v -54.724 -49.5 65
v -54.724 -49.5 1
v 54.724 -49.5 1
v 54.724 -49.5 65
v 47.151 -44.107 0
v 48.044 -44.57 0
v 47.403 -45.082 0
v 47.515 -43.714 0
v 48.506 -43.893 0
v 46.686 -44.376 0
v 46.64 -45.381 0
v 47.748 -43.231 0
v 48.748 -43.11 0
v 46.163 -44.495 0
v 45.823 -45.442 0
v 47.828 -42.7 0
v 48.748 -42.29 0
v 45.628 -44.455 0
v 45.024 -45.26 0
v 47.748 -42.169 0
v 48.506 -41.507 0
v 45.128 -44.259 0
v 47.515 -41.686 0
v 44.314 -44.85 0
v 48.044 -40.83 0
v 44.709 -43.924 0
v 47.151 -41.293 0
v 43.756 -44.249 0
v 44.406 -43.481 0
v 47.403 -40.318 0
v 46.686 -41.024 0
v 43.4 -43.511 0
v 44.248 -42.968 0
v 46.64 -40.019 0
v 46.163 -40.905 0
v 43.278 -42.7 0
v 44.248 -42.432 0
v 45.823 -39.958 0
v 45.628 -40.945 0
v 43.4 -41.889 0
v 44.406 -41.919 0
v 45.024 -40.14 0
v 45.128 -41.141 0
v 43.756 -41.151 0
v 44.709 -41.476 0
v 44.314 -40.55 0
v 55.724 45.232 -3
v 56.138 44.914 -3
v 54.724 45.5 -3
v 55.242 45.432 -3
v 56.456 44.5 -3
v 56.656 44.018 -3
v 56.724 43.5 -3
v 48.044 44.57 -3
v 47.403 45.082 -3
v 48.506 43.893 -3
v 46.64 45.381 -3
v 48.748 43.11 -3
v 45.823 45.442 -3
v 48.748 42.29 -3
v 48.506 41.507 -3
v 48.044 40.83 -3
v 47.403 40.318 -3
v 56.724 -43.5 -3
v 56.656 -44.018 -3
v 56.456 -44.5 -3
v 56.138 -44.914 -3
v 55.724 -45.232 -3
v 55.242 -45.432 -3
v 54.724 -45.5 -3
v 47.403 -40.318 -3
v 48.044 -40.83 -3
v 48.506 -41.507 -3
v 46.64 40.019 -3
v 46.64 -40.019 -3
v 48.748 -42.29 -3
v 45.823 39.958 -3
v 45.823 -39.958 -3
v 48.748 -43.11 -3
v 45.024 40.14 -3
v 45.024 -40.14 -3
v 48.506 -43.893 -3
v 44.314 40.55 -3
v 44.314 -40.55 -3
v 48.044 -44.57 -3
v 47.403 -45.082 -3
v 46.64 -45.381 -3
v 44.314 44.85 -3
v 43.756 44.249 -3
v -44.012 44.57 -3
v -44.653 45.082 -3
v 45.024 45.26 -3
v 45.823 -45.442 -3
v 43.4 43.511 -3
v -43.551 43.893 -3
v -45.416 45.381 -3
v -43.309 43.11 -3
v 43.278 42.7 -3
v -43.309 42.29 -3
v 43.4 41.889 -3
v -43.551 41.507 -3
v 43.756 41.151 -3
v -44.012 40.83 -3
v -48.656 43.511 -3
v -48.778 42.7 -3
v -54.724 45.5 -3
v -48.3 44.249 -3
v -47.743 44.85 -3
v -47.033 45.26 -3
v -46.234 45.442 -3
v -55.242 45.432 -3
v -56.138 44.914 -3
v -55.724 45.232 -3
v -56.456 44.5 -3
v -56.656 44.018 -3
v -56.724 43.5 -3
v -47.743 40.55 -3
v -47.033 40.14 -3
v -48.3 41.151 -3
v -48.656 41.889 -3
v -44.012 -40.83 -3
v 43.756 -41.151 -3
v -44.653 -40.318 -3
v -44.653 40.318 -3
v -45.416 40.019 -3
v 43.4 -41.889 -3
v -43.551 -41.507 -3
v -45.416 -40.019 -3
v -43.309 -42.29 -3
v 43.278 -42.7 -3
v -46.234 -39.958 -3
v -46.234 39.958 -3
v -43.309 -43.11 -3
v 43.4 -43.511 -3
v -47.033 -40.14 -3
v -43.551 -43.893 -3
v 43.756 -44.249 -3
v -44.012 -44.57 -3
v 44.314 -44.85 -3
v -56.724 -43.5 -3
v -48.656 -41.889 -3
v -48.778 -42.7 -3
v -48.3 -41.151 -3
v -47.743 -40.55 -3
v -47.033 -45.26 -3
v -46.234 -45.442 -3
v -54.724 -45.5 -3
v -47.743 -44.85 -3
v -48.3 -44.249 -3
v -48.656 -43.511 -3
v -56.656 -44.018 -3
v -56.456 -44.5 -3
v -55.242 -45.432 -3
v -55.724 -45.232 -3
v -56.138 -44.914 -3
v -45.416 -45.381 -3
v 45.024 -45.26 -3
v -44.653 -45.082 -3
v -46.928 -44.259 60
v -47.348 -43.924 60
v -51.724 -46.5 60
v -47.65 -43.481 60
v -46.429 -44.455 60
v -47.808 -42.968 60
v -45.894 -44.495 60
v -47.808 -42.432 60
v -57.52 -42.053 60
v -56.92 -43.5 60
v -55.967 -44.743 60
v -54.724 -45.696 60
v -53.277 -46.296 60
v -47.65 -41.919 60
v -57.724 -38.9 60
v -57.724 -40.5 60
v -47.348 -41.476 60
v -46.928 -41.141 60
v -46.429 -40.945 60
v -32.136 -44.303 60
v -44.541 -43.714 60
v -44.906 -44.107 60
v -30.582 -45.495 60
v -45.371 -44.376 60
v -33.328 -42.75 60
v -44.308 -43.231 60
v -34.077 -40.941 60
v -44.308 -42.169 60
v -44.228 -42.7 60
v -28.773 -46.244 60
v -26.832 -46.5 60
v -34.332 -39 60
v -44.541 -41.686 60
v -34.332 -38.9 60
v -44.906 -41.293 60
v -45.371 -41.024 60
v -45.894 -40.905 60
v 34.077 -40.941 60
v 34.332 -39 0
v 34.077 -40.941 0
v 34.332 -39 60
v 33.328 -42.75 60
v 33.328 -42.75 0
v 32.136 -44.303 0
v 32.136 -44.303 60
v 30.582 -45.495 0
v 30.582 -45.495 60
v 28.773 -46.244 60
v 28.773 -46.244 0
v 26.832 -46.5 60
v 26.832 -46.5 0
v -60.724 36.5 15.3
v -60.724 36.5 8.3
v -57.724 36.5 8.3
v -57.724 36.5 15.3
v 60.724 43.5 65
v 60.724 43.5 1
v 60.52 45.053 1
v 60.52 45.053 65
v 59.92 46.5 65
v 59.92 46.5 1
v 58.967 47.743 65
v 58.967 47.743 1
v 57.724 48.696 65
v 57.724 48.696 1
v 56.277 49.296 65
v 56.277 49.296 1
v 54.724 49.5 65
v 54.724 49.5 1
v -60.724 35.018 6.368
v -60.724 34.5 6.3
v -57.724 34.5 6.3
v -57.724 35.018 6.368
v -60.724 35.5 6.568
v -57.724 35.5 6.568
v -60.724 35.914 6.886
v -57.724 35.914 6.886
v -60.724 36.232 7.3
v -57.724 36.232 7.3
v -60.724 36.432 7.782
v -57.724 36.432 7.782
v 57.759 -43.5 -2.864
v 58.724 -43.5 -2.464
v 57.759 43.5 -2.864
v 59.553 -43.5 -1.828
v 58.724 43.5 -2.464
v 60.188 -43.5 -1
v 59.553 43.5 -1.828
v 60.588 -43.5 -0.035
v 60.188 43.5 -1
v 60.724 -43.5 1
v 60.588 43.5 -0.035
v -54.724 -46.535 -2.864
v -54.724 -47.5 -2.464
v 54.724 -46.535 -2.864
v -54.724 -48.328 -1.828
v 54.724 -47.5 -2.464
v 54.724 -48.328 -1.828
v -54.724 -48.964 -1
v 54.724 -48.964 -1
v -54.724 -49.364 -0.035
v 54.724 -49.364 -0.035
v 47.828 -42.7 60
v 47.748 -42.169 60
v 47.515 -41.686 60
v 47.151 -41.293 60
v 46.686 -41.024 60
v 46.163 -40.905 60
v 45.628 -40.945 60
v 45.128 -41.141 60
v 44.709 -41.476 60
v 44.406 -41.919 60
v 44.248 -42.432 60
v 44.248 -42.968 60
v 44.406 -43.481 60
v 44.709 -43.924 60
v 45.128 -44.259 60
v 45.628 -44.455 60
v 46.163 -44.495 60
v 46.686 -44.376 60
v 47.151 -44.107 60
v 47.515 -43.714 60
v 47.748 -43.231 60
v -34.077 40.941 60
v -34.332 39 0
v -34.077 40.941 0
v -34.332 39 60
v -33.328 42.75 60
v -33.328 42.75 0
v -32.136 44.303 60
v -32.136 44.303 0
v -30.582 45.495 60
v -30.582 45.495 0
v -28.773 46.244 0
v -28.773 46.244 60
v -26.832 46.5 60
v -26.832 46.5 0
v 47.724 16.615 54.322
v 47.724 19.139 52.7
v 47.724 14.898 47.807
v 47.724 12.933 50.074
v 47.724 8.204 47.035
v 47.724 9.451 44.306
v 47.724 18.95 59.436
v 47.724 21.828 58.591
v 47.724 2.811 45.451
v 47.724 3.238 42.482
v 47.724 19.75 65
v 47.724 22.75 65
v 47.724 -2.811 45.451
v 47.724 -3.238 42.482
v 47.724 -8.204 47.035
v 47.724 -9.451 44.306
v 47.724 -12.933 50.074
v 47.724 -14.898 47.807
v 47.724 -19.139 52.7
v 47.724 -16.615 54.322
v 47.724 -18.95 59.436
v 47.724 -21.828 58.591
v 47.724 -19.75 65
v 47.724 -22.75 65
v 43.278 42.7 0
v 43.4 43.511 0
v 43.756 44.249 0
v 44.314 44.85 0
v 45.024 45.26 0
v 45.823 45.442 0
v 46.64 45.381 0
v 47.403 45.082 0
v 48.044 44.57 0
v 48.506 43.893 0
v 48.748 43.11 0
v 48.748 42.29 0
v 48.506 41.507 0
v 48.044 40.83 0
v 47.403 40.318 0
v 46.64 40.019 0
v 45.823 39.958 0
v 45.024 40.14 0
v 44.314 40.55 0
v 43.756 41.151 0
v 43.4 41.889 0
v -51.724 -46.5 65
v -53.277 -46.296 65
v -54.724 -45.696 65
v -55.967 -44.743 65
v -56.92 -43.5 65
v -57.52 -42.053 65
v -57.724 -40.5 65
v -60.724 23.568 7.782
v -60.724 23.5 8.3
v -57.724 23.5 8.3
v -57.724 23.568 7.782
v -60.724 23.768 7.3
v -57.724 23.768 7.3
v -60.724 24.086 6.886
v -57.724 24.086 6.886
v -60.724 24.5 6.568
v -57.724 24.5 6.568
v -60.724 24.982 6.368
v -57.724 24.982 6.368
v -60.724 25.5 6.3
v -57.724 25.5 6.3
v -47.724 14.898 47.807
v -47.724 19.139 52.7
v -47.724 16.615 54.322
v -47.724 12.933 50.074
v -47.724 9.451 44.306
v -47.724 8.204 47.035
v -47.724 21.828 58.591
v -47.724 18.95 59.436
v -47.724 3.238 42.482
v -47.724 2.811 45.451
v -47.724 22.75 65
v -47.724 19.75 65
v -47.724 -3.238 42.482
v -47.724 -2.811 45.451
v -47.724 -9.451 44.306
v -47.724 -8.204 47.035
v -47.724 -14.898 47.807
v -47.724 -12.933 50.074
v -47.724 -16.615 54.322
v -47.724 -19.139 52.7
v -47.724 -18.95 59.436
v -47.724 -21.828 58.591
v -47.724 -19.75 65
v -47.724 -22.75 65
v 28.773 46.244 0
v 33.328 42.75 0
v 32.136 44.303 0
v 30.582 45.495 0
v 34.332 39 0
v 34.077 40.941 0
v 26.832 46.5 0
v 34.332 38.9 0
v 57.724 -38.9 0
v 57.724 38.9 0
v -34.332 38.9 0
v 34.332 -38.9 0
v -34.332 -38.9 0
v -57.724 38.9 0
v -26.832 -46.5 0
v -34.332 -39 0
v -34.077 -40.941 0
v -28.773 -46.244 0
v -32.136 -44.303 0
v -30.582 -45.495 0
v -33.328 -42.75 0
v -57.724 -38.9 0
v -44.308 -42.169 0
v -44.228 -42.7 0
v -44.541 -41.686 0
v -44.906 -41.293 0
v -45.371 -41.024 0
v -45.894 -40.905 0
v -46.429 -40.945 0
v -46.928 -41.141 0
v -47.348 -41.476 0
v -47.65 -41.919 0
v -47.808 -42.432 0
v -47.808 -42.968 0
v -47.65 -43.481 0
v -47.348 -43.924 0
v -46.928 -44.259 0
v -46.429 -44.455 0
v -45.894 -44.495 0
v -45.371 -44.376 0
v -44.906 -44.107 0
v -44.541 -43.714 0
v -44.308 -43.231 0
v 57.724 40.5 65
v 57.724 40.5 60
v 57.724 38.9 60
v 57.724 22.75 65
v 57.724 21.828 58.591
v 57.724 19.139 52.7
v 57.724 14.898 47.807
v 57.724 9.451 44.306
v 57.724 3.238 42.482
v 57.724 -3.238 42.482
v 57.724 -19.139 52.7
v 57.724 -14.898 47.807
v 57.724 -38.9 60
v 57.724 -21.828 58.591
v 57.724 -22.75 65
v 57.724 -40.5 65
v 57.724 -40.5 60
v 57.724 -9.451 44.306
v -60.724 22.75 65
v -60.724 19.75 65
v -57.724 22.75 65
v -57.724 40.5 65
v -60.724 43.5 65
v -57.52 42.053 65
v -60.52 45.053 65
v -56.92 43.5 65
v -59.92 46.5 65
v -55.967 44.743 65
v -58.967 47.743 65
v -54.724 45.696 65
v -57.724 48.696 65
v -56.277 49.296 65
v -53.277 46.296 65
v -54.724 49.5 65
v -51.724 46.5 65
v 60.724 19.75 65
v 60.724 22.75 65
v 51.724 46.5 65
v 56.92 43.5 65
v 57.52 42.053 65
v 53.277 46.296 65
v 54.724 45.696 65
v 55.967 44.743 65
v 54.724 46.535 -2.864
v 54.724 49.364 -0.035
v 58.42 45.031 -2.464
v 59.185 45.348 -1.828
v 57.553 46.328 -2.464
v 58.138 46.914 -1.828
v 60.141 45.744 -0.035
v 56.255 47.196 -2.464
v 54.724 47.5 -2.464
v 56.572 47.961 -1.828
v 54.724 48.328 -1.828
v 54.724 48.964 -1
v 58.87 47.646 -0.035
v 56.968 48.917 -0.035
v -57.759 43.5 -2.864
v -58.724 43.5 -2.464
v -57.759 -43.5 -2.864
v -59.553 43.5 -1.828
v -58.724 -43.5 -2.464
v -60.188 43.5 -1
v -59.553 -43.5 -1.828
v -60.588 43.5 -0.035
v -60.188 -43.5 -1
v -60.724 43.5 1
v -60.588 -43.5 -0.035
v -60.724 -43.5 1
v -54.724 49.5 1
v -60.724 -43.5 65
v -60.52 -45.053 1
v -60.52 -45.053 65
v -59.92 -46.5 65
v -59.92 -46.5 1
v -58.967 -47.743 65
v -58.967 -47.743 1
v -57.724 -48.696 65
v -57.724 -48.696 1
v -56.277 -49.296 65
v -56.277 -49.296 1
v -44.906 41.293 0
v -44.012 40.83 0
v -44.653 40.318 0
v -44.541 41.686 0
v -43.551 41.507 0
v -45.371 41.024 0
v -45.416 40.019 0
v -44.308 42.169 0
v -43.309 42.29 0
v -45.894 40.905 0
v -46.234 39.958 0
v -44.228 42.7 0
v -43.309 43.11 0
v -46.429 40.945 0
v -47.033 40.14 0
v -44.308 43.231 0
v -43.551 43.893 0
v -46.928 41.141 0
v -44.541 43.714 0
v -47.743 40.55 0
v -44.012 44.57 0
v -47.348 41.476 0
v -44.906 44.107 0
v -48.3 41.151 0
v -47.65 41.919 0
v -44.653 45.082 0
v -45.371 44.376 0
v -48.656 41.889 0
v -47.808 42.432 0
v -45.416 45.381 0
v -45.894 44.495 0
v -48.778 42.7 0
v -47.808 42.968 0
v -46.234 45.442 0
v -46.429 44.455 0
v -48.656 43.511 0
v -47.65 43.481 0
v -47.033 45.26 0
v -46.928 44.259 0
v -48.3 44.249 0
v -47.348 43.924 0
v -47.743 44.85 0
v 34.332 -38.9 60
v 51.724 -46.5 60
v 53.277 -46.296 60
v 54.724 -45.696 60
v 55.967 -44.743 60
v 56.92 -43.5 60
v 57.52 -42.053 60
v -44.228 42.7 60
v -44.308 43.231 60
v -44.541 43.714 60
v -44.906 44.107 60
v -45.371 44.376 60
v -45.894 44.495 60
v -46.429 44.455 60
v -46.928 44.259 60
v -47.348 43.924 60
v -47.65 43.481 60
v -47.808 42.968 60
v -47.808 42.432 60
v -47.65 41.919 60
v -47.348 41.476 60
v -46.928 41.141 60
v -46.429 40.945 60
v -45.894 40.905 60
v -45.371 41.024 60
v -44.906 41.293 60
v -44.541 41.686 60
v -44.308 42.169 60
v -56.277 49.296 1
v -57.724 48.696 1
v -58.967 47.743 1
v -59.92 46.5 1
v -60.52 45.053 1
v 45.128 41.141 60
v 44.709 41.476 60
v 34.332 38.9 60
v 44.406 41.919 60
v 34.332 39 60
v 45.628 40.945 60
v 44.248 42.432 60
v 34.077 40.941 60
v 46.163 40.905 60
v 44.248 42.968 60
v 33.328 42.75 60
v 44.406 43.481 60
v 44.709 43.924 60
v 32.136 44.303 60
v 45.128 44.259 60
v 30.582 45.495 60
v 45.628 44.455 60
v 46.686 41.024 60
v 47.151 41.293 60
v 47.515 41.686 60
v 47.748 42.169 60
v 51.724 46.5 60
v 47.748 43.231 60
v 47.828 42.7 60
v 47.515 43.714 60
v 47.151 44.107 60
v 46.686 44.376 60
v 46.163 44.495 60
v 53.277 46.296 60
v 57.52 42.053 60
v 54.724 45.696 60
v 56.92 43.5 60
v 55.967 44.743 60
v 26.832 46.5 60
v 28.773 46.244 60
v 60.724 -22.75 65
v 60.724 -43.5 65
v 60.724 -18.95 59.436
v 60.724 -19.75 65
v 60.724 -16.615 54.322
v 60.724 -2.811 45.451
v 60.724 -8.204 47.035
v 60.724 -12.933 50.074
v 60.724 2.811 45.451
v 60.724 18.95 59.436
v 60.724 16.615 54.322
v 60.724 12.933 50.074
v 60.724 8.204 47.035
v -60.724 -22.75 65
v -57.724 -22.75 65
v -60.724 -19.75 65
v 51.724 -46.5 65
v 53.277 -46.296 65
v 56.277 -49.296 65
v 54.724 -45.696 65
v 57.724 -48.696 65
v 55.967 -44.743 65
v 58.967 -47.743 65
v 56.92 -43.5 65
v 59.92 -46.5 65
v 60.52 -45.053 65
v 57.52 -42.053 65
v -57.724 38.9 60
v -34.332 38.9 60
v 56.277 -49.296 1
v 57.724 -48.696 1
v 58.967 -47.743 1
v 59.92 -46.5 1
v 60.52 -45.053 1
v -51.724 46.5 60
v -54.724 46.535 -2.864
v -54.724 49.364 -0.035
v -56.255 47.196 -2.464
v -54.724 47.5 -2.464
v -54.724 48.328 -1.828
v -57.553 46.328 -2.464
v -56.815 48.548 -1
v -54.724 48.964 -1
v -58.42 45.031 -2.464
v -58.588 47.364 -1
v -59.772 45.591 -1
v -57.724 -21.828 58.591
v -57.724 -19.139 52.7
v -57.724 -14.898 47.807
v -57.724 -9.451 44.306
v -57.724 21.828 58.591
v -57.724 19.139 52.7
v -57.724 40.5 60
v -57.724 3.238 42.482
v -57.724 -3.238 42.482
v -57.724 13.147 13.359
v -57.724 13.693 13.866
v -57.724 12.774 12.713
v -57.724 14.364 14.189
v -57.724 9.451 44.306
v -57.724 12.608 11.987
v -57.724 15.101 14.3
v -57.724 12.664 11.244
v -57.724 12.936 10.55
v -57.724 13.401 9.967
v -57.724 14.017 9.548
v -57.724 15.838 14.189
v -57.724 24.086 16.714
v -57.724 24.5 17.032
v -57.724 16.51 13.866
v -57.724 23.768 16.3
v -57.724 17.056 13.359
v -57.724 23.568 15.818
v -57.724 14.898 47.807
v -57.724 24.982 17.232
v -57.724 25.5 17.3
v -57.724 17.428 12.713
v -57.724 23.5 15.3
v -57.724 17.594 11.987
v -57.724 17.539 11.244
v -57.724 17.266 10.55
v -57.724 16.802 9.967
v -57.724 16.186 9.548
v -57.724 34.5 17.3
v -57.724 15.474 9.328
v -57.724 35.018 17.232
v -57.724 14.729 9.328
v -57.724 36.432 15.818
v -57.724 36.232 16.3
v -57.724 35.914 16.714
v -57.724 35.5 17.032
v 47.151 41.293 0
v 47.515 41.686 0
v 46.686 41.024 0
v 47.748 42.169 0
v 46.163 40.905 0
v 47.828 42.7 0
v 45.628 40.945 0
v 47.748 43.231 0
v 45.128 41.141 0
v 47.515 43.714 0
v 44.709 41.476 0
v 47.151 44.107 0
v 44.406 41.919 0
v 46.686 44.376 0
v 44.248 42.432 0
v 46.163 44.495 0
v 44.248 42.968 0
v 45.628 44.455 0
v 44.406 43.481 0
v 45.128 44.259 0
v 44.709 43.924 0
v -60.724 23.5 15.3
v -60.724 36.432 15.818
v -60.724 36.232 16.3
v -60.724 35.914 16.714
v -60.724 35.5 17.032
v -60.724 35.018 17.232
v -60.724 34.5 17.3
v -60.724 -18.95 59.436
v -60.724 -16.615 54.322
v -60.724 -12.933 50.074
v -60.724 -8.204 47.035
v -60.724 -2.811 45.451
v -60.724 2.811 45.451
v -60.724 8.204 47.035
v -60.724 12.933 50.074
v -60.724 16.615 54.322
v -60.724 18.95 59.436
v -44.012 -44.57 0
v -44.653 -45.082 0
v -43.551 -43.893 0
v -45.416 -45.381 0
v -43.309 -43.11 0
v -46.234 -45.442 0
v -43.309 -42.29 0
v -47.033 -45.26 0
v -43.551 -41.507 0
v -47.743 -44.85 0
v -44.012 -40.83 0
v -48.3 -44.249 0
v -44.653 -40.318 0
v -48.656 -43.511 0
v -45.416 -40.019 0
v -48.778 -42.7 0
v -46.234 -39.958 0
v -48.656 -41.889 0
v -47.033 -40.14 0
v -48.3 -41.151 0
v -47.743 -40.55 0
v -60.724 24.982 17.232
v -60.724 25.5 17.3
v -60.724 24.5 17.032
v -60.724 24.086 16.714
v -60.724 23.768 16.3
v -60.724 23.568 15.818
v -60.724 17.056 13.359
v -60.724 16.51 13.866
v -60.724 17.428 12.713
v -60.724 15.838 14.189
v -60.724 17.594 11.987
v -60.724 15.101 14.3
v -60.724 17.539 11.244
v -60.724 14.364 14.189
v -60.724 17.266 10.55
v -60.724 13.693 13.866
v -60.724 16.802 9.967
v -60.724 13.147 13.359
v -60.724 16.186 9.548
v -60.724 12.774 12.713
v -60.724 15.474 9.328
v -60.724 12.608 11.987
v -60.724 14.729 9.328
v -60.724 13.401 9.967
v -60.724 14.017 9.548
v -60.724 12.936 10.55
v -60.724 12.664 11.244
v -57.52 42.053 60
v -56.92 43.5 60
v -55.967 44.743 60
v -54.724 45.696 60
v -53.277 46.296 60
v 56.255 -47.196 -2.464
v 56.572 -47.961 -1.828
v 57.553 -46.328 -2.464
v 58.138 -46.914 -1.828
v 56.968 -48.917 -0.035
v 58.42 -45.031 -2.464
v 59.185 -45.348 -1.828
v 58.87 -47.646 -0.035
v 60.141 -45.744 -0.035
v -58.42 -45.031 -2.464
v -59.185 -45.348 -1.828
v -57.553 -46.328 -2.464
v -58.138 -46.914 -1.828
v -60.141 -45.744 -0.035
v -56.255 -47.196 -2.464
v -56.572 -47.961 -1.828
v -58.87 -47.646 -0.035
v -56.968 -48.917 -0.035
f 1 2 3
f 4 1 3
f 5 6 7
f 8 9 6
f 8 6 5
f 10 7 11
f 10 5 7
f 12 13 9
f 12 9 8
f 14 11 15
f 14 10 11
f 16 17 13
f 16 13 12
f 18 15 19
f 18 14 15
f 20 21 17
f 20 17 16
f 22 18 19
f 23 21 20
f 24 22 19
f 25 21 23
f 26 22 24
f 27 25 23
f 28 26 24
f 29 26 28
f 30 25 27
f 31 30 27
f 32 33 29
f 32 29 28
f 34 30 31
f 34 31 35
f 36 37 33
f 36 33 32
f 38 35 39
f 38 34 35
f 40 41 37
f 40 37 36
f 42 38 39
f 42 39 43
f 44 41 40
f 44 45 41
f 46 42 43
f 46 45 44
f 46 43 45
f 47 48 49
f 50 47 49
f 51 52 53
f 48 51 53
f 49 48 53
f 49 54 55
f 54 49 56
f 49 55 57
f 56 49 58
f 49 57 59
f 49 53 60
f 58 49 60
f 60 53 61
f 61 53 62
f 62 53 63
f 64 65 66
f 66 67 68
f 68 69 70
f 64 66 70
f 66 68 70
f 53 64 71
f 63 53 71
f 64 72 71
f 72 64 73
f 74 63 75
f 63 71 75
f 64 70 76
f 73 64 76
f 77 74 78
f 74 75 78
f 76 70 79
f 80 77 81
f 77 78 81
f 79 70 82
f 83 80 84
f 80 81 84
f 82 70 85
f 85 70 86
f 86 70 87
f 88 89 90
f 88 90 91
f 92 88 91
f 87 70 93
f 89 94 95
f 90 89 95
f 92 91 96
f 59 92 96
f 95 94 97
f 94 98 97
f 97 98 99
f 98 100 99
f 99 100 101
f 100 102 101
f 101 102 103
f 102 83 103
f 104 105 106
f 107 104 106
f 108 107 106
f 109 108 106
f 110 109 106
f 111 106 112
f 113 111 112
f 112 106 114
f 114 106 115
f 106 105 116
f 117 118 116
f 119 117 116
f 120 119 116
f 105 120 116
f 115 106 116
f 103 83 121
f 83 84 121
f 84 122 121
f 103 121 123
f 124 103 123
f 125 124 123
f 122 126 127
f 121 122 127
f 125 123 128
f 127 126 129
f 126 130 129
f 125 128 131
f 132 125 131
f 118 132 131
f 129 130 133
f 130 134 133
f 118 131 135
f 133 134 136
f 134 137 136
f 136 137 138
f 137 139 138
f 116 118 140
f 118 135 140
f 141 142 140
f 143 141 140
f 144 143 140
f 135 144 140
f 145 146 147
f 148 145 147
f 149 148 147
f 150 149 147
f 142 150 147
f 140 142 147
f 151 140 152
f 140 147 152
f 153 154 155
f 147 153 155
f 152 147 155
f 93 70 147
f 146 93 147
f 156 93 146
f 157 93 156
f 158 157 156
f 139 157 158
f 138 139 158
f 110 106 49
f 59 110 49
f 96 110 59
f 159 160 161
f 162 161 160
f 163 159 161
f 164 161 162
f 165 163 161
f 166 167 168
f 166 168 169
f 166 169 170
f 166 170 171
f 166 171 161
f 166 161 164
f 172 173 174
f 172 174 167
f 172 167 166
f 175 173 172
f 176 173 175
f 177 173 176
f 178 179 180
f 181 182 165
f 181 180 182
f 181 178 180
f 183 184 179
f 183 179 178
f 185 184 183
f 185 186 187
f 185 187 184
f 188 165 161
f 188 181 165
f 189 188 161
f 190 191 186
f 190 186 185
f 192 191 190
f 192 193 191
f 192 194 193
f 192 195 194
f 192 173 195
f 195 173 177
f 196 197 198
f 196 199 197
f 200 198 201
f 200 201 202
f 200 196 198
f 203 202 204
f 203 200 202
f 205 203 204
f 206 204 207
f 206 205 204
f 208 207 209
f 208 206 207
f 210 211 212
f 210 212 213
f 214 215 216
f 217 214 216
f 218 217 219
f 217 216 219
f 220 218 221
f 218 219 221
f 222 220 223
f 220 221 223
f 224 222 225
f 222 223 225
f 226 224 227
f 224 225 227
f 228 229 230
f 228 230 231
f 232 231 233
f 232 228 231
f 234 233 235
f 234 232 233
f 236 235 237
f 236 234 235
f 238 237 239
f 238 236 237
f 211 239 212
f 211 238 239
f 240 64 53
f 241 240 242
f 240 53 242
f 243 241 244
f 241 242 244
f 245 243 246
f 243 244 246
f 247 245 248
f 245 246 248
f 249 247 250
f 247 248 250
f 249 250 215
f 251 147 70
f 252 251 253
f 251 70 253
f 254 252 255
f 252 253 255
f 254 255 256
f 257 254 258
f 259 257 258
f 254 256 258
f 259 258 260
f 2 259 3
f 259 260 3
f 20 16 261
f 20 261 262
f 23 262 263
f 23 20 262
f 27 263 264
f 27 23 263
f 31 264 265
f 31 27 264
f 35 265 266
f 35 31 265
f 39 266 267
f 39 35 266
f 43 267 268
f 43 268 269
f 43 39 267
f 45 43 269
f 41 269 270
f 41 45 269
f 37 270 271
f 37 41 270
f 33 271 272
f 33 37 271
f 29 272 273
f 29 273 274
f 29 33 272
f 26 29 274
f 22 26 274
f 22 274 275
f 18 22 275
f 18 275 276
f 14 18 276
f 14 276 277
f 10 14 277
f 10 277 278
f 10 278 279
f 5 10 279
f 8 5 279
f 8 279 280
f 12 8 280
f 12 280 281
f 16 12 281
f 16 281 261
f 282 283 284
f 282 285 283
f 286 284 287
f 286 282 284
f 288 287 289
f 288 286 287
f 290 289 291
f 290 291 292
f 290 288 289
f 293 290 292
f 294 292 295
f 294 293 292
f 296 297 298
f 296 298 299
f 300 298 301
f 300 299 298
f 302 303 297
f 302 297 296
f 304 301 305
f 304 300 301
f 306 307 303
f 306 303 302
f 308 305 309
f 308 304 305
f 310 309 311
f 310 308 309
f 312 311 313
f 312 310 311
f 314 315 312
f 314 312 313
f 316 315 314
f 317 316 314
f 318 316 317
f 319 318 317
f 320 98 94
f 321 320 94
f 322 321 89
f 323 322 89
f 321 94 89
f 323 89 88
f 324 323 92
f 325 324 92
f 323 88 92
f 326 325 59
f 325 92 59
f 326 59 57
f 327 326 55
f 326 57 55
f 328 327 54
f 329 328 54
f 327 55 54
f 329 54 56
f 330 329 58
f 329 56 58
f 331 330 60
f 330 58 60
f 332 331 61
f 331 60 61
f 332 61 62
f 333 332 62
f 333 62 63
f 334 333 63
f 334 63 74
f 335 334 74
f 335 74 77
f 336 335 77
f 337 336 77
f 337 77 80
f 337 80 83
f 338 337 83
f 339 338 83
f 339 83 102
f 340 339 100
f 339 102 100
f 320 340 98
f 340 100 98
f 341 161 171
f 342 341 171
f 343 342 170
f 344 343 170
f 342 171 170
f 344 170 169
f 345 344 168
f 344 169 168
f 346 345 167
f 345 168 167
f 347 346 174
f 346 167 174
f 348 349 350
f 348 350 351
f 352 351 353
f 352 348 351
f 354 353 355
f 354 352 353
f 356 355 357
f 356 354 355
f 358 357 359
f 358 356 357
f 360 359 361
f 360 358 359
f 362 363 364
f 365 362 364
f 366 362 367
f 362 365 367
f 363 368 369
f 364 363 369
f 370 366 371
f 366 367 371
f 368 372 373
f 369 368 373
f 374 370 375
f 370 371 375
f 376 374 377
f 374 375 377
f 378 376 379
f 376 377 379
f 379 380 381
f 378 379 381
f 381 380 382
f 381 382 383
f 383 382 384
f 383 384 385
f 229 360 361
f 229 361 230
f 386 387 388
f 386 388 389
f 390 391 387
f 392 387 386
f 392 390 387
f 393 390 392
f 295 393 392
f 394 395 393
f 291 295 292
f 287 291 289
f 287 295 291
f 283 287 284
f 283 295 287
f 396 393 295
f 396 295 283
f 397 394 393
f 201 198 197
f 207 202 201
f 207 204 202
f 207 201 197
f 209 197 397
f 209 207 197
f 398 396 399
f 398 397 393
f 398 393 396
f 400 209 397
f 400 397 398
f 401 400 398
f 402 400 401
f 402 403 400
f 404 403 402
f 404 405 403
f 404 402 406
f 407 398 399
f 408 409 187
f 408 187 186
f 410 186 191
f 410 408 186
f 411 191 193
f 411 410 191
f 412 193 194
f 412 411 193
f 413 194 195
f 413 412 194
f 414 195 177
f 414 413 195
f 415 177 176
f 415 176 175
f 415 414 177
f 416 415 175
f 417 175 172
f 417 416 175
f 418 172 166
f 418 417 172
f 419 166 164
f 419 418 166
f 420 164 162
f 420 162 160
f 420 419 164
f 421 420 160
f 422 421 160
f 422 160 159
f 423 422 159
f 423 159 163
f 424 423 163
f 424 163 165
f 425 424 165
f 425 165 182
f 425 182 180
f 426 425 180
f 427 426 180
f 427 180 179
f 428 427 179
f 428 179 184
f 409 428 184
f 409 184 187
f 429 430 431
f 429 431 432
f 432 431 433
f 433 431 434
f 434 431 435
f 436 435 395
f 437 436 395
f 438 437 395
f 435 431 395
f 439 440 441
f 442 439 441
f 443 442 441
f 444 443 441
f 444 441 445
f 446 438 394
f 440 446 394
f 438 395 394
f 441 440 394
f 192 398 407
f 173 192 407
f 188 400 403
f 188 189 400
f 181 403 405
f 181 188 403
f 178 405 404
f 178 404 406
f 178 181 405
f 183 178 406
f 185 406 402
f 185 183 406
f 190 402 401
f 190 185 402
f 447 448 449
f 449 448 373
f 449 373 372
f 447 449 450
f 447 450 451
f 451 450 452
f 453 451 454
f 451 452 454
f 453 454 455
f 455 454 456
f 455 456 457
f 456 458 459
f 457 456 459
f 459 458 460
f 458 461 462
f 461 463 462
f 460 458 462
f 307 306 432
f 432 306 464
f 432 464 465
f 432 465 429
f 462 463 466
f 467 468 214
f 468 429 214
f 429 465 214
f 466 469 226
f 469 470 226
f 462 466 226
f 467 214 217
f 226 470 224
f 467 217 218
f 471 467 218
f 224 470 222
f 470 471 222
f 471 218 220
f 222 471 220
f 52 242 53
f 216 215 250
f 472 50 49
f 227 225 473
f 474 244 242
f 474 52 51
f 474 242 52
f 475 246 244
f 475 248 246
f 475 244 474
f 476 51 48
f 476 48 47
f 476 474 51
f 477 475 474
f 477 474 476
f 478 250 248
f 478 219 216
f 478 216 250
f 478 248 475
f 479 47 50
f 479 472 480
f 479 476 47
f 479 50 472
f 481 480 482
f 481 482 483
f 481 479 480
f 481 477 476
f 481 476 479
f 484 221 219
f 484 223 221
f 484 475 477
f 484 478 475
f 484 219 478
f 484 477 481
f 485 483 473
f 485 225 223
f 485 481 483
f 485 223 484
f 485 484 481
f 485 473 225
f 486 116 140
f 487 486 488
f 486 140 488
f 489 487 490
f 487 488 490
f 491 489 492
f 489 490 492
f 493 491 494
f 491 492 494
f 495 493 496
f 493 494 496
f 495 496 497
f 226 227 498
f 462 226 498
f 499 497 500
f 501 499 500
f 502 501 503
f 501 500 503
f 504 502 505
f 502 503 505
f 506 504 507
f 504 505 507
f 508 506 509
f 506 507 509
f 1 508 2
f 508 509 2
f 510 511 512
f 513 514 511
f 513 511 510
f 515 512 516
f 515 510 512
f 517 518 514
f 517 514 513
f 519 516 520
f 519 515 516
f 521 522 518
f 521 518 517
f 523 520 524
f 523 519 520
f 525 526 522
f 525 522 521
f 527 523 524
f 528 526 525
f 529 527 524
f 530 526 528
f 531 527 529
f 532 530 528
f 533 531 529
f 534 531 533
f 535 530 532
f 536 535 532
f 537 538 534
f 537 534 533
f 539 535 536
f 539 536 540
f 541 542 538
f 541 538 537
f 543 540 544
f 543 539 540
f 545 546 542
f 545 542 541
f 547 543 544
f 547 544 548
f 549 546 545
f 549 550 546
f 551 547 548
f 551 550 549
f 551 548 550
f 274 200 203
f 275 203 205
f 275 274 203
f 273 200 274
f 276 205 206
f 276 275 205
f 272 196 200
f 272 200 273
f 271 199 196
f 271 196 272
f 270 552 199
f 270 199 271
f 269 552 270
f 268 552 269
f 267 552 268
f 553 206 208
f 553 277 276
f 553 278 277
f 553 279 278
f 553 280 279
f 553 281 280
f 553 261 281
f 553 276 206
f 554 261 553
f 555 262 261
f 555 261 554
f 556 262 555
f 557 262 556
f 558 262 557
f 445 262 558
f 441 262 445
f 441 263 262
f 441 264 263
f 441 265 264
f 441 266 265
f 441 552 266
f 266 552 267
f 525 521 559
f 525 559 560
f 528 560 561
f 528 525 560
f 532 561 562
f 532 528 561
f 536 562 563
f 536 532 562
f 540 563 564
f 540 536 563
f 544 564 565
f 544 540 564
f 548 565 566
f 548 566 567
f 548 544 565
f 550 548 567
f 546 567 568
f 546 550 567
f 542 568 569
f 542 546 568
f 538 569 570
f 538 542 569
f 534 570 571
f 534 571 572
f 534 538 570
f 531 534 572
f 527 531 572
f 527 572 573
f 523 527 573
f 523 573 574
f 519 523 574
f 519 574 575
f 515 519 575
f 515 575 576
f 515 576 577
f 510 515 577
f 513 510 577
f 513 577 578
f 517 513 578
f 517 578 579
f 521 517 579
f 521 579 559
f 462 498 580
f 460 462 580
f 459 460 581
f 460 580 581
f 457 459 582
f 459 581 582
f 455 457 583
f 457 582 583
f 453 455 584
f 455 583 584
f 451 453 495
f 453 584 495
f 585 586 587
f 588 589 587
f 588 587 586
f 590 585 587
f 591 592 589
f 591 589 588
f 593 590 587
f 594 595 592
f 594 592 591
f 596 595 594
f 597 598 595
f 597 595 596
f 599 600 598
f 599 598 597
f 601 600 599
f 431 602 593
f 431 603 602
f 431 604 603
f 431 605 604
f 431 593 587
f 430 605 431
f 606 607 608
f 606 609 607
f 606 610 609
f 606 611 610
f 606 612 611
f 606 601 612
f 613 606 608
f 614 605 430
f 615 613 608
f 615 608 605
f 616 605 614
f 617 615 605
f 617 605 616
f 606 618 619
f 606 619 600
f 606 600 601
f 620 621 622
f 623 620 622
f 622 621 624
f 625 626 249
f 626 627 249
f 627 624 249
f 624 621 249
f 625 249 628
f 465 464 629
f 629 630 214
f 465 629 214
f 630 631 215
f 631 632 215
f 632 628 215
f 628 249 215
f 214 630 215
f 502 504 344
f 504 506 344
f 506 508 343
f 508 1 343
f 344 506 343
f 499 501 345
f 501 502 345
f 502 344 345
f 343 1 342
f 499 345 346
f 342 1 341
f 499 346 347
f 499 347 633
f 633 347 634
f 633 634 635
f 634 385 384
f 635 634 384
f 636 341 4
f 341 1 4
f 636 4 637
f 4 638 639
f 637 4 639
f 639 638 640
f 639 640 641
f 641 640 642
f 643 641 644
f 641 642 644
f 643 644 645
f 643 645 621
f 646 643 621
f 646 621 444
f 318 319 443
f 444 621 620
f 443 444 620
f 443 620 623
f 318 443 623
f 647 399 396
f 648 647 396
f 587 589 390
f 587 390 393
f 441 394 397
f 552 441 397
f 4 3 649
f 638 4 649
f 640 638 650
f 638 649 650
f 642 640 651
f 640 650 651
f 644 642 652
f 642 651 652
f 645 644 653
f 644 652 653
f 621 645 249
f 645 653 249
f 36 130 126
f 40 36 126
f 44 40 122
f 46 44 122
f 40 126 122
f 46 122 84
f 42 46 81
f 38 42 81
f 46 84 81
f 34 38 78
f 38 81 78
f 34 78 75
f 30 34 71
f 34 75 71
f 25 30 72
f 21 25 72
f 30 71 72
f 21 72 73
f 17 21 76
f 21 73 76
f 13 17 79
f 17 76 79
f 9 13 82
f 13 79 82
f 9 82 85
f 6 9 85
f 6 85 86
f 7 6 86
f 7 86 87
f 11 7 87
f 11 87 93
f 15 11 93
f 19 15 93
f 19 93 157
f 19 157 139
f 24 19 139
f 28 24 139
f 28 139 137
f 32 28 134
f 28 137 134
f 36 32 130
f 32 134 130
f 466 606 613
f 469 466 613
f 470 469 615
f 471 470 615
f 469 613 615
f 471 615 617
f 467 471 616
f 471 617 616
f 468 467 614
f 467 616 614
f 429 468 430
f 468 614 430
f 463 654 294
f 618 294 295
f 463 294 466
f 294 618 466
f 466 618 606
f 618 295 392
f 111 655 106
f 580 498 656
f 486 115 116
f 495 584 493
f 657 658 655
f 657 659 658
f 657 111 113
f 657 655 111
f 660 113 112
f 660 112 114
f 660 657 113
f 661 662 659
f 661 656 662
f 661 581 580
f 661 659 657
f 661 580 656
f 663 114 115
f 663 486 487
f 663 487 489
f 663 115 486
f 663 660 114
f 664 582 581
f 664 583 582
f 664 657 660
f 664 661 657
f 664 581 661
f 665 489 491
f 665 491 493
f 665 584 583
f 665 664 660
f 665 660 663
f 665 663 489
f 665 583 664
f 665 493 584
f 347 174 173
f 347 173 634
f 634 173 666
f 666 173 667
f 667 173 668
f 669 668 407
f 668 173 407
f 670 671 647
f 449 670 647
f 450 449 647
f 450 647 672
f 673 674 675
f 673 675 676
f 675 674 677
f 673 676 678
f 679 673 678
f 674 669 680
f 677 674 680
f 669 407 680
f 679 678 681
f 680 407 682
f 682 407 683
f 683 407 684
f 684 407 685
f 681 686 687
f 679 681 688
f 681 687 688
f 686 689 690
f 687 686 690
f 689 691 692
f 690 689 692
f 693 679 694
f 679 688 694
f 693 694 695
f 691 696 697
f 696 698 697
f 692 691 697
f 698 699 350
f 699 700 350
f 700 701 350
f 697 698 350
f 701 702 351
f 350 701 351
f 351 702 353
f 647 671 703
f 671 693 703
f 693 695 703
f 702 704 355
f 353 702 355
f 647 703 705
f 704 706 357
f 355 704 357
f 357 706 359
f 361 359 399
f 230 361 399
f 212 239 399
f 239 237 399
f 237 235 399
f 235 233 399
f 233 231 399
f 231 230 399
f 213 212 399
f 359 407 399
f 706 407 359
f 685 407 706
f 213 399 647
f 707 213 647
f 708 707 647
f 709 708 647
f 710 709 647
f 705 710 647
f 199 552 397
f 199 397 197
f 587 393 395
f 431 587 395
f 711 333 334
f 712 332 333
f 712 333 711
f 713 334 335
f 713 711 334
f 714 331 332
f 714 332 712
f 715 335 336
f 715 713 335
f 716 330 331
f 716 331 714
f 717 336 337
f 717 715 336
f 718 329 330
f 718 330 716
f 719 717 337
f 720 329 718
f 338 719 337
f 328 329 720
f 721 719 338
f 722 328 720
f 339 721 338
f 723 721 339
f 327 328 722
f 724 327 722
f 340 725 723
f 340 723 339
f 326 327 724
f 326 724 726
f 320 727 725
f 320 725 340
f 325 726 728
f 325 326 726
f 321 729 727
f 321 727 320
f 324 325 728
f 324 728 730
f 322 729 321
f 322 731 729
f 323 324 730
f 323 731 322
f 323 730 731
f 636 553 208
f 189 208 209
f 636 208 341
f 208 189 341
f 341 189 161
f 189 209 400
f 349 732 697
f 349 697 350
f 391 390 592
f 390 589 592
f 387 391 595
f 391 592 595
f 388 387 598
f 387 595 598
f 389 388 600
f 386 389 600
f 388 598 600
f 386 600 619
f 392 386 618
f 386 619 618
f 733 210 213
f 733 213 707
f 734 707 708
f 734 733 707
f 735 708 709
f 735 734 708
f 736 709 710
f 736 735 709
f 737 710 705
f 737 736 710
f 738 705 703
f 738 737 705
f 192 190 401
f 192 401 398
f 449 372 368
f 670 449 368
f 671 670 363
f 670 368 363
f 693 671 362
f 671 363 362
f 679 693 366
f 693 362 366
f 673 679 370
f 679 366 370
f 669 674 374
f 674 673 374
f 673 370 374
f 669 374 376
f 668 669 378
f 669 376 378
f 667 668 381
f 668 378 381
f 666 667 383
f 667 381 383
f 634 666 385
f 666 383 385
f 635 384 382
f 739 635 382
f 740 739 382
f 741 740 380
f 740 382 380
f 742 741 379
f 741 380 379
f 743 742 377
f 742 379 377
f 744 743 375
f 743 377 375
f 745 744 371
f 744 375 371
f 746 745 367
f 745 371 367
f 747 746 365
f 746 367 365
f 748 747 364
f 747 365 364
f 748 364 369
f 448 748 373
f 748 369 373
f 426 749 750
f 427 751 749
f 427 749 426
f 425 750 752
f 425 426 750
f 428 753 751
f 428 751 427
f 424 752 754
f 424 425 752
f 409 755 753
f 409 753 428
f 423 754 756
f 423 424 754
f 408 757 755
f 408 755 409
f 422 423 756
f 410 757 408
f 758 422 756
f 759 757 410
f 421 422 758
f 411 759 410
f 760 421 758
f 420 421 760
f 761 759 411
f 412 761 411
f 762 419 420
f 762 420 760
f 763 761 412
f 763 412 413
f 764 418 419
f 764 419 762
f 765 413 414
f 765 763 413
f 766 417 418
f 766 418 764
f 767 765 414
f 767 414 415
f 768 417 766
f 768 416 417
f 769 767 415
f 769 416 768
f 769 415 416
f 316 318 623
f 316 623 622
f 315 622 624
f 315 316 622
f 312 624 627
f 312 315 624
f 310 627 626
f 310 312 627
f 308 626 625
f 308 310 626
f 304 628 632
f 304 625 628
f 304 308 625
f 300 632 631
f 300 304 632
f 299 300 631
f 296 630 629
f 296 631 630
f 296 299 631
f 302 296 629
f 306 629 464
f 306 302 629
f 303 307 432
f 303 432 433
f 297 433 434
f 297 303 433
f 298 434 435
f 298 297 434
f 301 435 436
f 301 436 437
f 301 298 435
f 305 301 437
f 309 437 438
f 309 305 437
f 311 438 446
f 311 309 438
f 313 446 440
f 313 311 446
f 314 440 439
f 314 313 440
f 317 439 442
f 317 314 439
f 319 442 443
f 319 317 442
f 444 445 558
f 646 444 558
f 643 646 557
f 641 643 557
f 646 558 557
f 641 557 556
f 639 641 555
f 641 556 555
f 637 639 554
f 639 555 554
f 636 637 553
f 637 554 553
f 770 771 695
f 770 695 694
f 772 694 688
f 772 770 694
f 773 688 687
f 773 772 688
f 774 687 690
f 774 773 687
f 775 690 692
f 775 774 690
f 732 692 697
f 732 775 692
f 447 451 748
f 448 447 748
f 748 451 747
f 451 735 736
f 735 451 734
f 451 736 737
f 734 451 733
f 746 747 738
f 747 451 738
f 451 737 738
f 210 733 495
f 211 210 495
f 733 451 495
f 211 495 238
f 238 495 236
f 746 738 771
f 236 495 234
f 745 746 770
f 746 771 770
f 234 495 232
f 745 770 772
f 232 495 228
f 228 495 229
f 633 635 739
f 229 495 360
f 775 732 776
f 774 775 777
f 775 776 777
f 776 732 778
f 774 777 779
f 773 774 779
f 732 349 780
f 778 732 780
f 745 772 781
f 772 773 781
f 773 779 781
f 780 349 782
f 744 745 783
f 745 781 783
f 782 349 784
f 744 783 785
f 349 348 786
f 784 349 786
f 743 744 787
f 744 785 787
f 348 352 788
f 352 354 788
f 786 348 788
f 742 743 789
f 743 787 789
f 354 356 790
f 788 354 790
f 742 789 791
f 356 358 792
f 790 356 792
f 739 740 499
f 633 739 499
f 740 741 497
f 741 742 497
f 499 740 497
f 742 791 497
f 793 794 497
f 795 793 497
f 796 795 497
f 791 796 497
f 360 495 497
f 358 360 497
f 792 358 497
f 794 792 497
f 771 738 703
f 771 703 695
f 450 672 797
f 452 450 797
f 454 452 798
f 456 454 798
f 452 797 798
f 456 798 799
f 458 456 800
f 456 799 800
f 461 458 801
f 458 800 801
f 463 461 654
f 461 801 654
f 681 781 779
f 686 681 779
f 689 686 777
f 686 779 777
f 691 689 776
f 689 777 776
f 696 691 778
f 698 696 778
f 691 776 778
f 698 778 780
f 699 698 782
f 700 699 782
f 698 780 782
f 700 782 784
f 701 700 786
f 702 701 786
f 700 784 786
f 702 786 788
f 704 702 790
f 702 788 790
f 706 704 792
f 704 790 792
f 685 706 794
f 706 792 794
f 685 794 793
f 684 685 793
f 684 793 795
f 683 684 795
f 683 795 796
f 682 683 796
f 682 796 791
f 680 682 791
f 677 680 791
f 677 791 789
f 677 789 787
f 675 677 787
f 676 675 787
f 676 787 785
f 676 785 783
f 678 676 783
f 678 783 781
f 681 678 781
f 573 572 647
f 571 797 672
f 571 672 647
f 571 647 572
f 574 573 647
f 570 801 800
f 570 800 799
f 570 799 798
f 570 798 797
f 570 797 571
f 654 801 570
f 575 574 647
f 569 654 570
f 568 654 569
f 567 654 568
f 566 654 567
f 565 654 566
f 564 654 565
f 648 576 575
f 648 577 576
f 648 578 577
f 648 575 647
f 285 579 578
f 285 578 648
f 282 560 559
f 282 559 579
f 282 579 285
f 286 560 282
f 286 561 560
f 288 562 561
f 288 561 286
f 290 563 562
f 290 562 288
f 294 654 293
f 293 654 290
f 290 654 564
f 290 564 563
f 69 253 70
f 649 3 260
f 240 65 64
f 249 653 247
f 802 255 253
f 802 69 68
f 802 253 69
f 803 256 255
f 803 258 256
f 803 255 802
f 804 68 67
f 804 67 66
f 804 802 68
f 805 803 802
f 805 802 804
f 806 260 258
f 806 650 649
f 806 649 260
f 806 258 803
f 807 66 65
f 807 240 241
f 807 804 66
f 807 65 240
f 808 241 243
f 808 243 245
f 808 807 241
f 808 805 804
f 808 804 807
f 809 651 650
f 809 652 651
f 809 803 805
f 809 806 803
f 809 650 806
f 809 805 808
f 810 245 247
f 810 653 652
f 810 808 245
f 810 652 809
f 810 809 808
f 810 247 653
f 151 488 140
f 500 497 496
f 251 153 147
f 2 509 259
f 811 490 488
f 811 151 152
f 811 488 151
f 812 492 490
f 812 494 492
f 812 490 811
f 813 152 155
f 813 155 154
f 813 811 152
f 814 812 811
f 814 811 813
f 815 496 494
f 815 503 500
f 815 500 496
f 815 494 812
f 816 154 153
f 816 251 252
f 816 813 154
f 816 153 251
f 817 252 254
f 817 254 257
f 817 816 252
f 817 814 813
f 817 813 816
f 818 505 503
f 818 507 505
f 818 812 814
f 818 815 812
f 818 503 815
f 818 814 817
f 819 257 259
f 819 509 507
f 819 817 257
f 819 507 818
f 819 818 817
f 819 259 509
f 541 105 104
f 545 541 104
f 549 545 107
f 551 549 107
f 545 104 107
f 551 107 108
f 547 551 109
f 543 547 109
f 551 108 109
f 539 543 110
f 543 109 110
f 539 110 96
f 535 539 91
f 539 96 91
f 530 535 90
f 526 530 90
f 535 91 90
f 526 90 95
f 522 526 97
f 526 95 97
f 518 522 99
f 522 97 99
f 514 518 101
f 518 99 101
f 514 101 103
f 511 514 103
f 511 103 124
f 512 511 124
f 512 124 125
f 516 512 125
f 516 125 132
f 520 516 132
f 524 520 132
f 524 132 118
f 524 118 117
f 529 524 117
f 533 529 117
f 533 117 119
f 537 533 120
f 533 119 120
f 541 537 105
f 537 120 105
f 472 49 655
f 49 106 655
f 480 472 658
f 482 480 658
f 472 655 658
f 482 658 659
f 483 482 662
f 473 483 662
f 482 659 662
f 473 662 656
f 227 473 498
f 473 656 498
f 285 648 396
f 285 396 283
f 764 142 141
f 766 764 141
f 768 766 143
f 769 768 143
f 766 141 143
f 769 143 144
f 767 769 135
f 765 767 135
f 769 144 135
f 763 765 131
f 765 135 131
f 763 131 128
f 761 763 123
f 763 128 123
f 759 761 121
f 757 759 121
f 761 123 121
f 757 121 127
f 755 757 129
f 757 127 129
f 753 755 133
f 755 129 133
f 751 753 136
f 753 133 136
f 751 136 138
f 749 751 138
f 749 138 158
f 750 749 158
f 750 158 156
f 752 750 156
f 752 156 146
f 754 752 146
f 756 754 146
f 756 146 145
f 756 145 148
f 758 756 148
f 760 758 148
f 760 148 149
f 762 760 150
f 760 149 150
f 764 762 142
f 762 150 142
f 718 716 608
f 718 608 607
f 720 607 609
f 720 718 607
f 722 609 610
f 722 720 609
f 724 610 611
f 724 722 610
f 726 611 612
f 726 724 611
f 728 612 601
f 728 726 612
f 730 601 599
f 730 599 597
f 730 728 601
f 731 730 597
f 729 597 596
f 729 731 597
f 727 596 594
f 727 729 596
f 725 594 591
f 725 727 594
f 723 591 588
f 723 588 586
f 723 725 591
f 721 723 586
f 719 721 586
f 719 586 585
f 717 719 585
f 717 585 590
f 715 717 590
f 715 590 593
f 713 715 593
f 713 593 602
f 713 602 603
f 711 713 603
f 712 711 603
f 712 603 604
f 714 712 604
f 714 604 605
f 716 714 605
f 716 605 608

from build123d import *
from build123d.topology import SkipClean

# Parameters (mm, degrees)
BOSS_EXTRUDE1_DEPTH = 65
BOSS_EXTRUDE3_START = 3
BOSS_EXTRUDE3_DEPTH = 3
SKETCH4_R           = 19.75
CUT_EXTRUDE1_DEPTH  = 132
SKETCH8_R           = 1.8
BOSS_EXTRUDE6_DEPTH = 60
FILLET1_R           = 7.5
FILLET2_R           = 7.5
FILLET3_R           = 7.5
FILLET4_R           = 7.5
BOSS_EXTRUDE8_DEPTH = 10
FILLET8_R           = 4
CUT_EXTRUDE2_START  = -40
SKETCH13_R          = 1.8
CUT_EXTRUDE2_DEPTH  = 40
SKETCH14_R          = 2.75
CUT_EXTRUDE3_DEPTH  = 3
CUT_EXTRUDE4_DEPTH  = 11.8
SKETCH16_R          = 2.5
CUT_EXTRUDE5_DEPTH  = 12.8
SKETCH18_W          = 9.402156545
SKETCH18_H          = 47.685659657
SKETCH18_W_2        = 10.670772927
CUT_EXTRUDE6_DEPTH  = 23.8


with BuildPart() as part:
    # Sketch1 → Boss-Extrude1 (new body)
    with BuildSketch(Plane(origin=(0, 0, 0), x_dir=(0, 1, 0), z_dir=(0, 0, 1))):
        with BuildLine():
            ThreePointArc((-43.5, 60.724137931), (-47.742640687, 58.966778618), (-49.5, 54.724137931))
            Line((-49.5, 54.724137931), (-49.5, -54.724137931))
            ThreePointArc((-49.5, -54.724137931), (-47.742640687, -58.966778618), (-43.5, -60.724137931))
            Line((-43.5, -60.724137931), (43.5, -60.724137931))
            ThreePointArc((43.5, -60.724137931), (47.742640687, -58.966778618), (49.5, -54.724137931))
            Line((49.5, -54.724137931), (49.5, 54.724137931))
            ThreePointArc((49.5, 54.724137931), (47.742640687, 58.966778618), (43.5, 60.724137931))
            Line((43.5, 60.724137931), (-43.5, 60.724137931))
        make_face()
        with BuildLine():
            ThreePointArc((-46.5, 51.724137931), (-44.742640687, 55.966778618), (-40.5, 57.724137931))
            Line((-40.5, 57.724137931), (40.5, 57.724137931))
            ThreePointArc((40.5, 57.724137931), (44.742640687, 55.966778618), (46.5, 51.724137931))
            Line((46.5, 51.724137931), (46.5, -51.724137931))
            ThreePointArc((46.5, -51.724137931), (44.742640687, -55.966778618), (40.5, -57.724137931))
            Line((40.5, -57.724137931), (-40.5, -57.724137931))
            ThreePointArc((-40.5, -57.724137931), (-44.742640687, -55.966778618), (-46.5, -51.724137931))
            Line((-46.5, -51.724137931), (-46.5, 51.724137931))
        make_face(mode=Mode.SUBTRACT)
    extrude(amount=BOSS_EXTRUDE1_DEPTH)

    # Sketch3 → Boss-Extrude3 (add)
    with BuildSketch(Plane(origin=(0, 0, 0), x_dir=(1, 0, 0), z_dir=(0, 0, -1)).offset(BOSS_EXTRUDE3_START)):
        with BuildLine():
            Line((-54.724137931, 49.5), (54.724137931, 49.5))
            ThreePointArc((54.724137931, 49.5), (58.966778618, 47.742640687), (60.724137931, 43.5))
            Line((60.724137931, 43.5), (60.724137931, -43.5))
            ThreePointArc((60.724137931, -43.5), (58.966778618, -47.742640687), (54.724137931, -49.5))
            Line((54.724137931, -49.5), (-54.724137931, -49.5))
            ThreePointArc((-54.724137931, -49.5), (-58.966778618, -47.742640687), (-60.724137931, -43.5))
            Line((-60.724137931, -43.5), (-60.724137931, 43.5))
            ThreePointArc((-60.724137931, 43.5), (-58.966778618, 47.742640687), (-54.724137931, 49.5))
        make_face()
    extrude(amount=-BOSS_EXTRUDE3_DEPTH)

    # Sketch4 → Cut-Extrude1 (cut)
    with BuildSketch(Plane.YZ.offset(60.724137931)):
        with Locations((0, 65)):
            Circle(SKETCH4_R)
    extrude(amount=-CUT_EXTRUDE1_DEPTH, mode=Mode.SUBTRACT)

    # Sketch8 → Boss-Extrude6 (add)
    # profile 1 of 4: a face of its own
    with BuildSketch(Plane.XY):
        with BuildLine():
            Line((-34.332324886, 46.5), (-51.724137931, 46.5))
            ThreePointArc((-51.724137931, 46.5), (-55.966778618, 44.742640687), (-57.724137931, 40.5))
            Line((-57.724137931, 40.5), (-57.724137931, 38.9))
            Line((-57.724137931, 38.9), (-34.332324886, 38.9))
            Line((-34.332324886, 38.9), (-34.332324886, 46.5))
        make_face()
        with Locations((-46.028231409, 42.7)):
            Circle(SKETCH8_R, mode=Mode.SUBTRACT)
    # profile 2 of 4: a face of its own
    with BuildSketch(Plane.XY):
        with BuildLine():
            Line((51.724137931, 46.5), (34.332324886, 46.5))
            Line((34.332324886, 46.5), (34.332324886, 38.9))
            Line((34.332324886, 38.9), (57.724137931, 38.9))
            Line((57.724137931, 38.9), (57.724137931, 40.5))
            ThreePointArc((57.724137931, 40.5), (55.966778618, 44.742640687), (51.724137931, 46.5))
        make_face()
        with Locations((46.028231409, 42.7)):
            Circle(SKETCH8_R, mode=Mode.SUBTRACT)
    # profile 3 of 4: a face of its own
    with BuildSketch(Plane.XY):
        with BuildLine():
            Line((-34.332324886, -38.9), (-57.724137931, -38.9))
            Line((-57.724137931, -38.9), (-57.724137931, -40.5))
            ThreePointArc((-57.724137931, -40.5), (-55.966778618, -44.742640687), (-51.724137931, -46.5))
            Line((-51.724137931, -46.5), (-34.332324886, -46.5))
            Line((-34.332324886, -46.5), (-34.332324886, -38.9))
        make_face()
        with Locations((-46.028231409, -42.7)):
            Circle(SKETCH8_R, mode=Mode.SUBTRACT)
    # profile 4 of 4: a face of its own
    with BuildSketch(Plane.XY):
        with BuildLine():
            Line((57.724137931, -40.5), (57.724137931, -38.9))
            Line((57.724137931, -38.9), (34.332324886, -38.9))
            Line((34.332324886, -38.9), (34.332324886, -46.5))
            Line((34.332324886, -46.5), (51.724137931, -46.5))
            ThreePointArc((51.724137931, -46.5), (55.966778618, -44.742640687), (57.724137931, -40.5))
        make_face()
        with Locations((46.028231409, -42.7)):
            Circle(SKETCH8_R, mode=Mode.SUBTRACT)
    extrude(amount=BOSS_EXTRUDE6_DEPTH)

    # Fillet1
    fillet1_edges = [part.edges().sort_by_distance(p)[0] for p in [
        (-34.332324886, 46.5, 30),
    ]]
    fillet(fillet1_edges, radius=FILLET1_R)

    # Fillet2
    fillet2_edges = [part.edges().sort_by_distance(p)[0] for p in [
        (34.332324886, 46.5, 30),
    ]]
    fillet(fillet2_edges, radius=FILLET2_R)

    # Fillet3
    fillet3_edges = [part.edges().sort_by_distance(p)[0] for p in [
        (-34.332324886, -46.5, 30),
    ]]
    fillet(fillet3_edges, radius=FILLET3_R)

    # Fillet4
    fillet4_edges = [part.edges().sort_by_distance(p)[0] for p in [
        (34.332324886, -46.5, 30),
    ]]
    fillet(fillet4_edges, radius=FILLET4_R)

    # Sketch12 → Boss-Extrude8 (add, symmetric)
    with SkipClean():  # the faces are left unmerged after this step: merging them gives an invalid solid
        with BuildSketch(Plane(origin=(57.724137931, 0, 0), x_dir=(0, -1, 0), z_dir=(-1, 0, 0))):
            with BuildLine():
                Line((-19.75, 65), (-22.75, 65))
                ThreePointArc((-22.75, 65), (0, 42.25), (22.75, 65))
                Line((22.75, 65), (19.75, 65))
                ThreePointArc((19.75, 65), (0, 45.25), (-19.75, 65))
            make_face()
        boss_extrude8 = extrude(amount=BOSS_EXTRUDE8_DEPTH, both=True)
    add(part.part.scale(1), mode=Mode.REPLACE)  # the faces are merged on a copy

    # Mirror2: Boss-Extrude8 across plane
    add(boss_extrude8.mirror(Plane(origin=(0, 0, 0), x_dir=(0, 0, 1), z_dir=(1, 0, 0))))

    # Fillet8
    fillet8_edges = [part.edges().sort_by_distance(p)[0] for p in [
        (-60.724137931, 0, -3),
    ]]
    fillet(fillet8_edges, radius=FILLET8_R)

    # Sketch13 → Cut-Extrude2 (cut)
    with BuildSketch(Plane.XY.offset(CUT_EXTRUDE2_START)):
        with Locations((-46.028231409, 42.7)):
            Circle(SKETCH13_R)
        with Locations((46.028231409, 42.7)):
            Circle(SKETCH13_R)
        with Locations((-46.028231409, -42.7)):
            Circle(SKETCH13_R)
        with Locations((46.028231409, -42.7)):
            Circle(SKETCH13_R)
    extrude(amount=CUT_EXTRUDE2_DEPTH, mode=Mode.SUBTRACT)

    # Sketch14 → Cut-Extrude3 (cut)
    with BuildSketch(Plane(origin=(0, 0, -3), x_dir=(1, 0, 0), z_dir=(0, 0, -1))):
        with Locations((-46.028231409, 42.7)):
            Circle(SKETCH14_R)
        with Locations((-46.028231409, -42.7)):
            Circle(SKETCH14_R)
        with Locations((46.028231409, -42.7)):
            Circle(SKETCH14_R)
        with Locations((46.028231409, 42.7)):
            Circle(SKETCH14_R)
    extrude(amount=-CUT_EXTRUDE3_DEPTH, mode=Mode.SUBTRACT)

    # Sketch15 → Cut-Extrude4 (cut)
    with BuildSketch(Plane(origin=(-60.724137931, 0, 0), x_dir=(0, -1, 0), z_dir=(-1, 0, 0))):
        with BuildLine():
            Line((-34.5, 17.3), (-25.5, 17.3))
            ThreePointArc((-25.5, 17.3), (-24.085786438, 16.714213562), (-23.5, 15.3))
            Line((-23.5, 15.3), (-23.5, 8.3))
            ThreePointArc((-23.5, 8.3), (-24.085786438, 6.885786438), (-25.5, 6.3))
            Line((-25.5, 6.3), (-34.5, 6.3))
            ThreePointArc((-34.5, 6.3), (-35.914213562, 6.885786438), (-36.5, 8.3))
            Line((-36.5, 8.3), (-36.5, 15.3))
            ThreePointArc((-36.5, 15.3), (-35.914213562, 16.714213562), (-34.5, 17.3))
        make_face()
    extrude(amount=-CUT_EXTRUDE4_DEPTH, mode=Mode.SUBTRACT)

    # Sketch16 → Cut-Extrude5 (cut)
    with BuildSketch(Plane(origin=(-60.724137931, 0, 0), x_dir=(0, -1, 0), z_dir=(-1, 0, 0))):
        with Locations((-15.101265496, 11.8)):
            Circle(SKETCH16_R)
    extrude(amount=-CUT_EXTRUDE5_DEPTH, mode=Mode.SUBTRACT)

    # Sketch18 → Cut-Extrude6 (cut)
    with BuildSketch(Plane.XY.offset(65)):
        with Locations((-65.425216203, -1.092829829)):
            Rectangle(SKETCH18_W, SKETCH18_H)
        with Locations((66.059524395, -1.092829829)):
            Rectangle(SKETCH18_W_2, SKETCH18_H)
    extrude(amount=-CUT_EXTRUDE6_DEPTH, mode=Mode.SUBTRACT)


solid = part.part
